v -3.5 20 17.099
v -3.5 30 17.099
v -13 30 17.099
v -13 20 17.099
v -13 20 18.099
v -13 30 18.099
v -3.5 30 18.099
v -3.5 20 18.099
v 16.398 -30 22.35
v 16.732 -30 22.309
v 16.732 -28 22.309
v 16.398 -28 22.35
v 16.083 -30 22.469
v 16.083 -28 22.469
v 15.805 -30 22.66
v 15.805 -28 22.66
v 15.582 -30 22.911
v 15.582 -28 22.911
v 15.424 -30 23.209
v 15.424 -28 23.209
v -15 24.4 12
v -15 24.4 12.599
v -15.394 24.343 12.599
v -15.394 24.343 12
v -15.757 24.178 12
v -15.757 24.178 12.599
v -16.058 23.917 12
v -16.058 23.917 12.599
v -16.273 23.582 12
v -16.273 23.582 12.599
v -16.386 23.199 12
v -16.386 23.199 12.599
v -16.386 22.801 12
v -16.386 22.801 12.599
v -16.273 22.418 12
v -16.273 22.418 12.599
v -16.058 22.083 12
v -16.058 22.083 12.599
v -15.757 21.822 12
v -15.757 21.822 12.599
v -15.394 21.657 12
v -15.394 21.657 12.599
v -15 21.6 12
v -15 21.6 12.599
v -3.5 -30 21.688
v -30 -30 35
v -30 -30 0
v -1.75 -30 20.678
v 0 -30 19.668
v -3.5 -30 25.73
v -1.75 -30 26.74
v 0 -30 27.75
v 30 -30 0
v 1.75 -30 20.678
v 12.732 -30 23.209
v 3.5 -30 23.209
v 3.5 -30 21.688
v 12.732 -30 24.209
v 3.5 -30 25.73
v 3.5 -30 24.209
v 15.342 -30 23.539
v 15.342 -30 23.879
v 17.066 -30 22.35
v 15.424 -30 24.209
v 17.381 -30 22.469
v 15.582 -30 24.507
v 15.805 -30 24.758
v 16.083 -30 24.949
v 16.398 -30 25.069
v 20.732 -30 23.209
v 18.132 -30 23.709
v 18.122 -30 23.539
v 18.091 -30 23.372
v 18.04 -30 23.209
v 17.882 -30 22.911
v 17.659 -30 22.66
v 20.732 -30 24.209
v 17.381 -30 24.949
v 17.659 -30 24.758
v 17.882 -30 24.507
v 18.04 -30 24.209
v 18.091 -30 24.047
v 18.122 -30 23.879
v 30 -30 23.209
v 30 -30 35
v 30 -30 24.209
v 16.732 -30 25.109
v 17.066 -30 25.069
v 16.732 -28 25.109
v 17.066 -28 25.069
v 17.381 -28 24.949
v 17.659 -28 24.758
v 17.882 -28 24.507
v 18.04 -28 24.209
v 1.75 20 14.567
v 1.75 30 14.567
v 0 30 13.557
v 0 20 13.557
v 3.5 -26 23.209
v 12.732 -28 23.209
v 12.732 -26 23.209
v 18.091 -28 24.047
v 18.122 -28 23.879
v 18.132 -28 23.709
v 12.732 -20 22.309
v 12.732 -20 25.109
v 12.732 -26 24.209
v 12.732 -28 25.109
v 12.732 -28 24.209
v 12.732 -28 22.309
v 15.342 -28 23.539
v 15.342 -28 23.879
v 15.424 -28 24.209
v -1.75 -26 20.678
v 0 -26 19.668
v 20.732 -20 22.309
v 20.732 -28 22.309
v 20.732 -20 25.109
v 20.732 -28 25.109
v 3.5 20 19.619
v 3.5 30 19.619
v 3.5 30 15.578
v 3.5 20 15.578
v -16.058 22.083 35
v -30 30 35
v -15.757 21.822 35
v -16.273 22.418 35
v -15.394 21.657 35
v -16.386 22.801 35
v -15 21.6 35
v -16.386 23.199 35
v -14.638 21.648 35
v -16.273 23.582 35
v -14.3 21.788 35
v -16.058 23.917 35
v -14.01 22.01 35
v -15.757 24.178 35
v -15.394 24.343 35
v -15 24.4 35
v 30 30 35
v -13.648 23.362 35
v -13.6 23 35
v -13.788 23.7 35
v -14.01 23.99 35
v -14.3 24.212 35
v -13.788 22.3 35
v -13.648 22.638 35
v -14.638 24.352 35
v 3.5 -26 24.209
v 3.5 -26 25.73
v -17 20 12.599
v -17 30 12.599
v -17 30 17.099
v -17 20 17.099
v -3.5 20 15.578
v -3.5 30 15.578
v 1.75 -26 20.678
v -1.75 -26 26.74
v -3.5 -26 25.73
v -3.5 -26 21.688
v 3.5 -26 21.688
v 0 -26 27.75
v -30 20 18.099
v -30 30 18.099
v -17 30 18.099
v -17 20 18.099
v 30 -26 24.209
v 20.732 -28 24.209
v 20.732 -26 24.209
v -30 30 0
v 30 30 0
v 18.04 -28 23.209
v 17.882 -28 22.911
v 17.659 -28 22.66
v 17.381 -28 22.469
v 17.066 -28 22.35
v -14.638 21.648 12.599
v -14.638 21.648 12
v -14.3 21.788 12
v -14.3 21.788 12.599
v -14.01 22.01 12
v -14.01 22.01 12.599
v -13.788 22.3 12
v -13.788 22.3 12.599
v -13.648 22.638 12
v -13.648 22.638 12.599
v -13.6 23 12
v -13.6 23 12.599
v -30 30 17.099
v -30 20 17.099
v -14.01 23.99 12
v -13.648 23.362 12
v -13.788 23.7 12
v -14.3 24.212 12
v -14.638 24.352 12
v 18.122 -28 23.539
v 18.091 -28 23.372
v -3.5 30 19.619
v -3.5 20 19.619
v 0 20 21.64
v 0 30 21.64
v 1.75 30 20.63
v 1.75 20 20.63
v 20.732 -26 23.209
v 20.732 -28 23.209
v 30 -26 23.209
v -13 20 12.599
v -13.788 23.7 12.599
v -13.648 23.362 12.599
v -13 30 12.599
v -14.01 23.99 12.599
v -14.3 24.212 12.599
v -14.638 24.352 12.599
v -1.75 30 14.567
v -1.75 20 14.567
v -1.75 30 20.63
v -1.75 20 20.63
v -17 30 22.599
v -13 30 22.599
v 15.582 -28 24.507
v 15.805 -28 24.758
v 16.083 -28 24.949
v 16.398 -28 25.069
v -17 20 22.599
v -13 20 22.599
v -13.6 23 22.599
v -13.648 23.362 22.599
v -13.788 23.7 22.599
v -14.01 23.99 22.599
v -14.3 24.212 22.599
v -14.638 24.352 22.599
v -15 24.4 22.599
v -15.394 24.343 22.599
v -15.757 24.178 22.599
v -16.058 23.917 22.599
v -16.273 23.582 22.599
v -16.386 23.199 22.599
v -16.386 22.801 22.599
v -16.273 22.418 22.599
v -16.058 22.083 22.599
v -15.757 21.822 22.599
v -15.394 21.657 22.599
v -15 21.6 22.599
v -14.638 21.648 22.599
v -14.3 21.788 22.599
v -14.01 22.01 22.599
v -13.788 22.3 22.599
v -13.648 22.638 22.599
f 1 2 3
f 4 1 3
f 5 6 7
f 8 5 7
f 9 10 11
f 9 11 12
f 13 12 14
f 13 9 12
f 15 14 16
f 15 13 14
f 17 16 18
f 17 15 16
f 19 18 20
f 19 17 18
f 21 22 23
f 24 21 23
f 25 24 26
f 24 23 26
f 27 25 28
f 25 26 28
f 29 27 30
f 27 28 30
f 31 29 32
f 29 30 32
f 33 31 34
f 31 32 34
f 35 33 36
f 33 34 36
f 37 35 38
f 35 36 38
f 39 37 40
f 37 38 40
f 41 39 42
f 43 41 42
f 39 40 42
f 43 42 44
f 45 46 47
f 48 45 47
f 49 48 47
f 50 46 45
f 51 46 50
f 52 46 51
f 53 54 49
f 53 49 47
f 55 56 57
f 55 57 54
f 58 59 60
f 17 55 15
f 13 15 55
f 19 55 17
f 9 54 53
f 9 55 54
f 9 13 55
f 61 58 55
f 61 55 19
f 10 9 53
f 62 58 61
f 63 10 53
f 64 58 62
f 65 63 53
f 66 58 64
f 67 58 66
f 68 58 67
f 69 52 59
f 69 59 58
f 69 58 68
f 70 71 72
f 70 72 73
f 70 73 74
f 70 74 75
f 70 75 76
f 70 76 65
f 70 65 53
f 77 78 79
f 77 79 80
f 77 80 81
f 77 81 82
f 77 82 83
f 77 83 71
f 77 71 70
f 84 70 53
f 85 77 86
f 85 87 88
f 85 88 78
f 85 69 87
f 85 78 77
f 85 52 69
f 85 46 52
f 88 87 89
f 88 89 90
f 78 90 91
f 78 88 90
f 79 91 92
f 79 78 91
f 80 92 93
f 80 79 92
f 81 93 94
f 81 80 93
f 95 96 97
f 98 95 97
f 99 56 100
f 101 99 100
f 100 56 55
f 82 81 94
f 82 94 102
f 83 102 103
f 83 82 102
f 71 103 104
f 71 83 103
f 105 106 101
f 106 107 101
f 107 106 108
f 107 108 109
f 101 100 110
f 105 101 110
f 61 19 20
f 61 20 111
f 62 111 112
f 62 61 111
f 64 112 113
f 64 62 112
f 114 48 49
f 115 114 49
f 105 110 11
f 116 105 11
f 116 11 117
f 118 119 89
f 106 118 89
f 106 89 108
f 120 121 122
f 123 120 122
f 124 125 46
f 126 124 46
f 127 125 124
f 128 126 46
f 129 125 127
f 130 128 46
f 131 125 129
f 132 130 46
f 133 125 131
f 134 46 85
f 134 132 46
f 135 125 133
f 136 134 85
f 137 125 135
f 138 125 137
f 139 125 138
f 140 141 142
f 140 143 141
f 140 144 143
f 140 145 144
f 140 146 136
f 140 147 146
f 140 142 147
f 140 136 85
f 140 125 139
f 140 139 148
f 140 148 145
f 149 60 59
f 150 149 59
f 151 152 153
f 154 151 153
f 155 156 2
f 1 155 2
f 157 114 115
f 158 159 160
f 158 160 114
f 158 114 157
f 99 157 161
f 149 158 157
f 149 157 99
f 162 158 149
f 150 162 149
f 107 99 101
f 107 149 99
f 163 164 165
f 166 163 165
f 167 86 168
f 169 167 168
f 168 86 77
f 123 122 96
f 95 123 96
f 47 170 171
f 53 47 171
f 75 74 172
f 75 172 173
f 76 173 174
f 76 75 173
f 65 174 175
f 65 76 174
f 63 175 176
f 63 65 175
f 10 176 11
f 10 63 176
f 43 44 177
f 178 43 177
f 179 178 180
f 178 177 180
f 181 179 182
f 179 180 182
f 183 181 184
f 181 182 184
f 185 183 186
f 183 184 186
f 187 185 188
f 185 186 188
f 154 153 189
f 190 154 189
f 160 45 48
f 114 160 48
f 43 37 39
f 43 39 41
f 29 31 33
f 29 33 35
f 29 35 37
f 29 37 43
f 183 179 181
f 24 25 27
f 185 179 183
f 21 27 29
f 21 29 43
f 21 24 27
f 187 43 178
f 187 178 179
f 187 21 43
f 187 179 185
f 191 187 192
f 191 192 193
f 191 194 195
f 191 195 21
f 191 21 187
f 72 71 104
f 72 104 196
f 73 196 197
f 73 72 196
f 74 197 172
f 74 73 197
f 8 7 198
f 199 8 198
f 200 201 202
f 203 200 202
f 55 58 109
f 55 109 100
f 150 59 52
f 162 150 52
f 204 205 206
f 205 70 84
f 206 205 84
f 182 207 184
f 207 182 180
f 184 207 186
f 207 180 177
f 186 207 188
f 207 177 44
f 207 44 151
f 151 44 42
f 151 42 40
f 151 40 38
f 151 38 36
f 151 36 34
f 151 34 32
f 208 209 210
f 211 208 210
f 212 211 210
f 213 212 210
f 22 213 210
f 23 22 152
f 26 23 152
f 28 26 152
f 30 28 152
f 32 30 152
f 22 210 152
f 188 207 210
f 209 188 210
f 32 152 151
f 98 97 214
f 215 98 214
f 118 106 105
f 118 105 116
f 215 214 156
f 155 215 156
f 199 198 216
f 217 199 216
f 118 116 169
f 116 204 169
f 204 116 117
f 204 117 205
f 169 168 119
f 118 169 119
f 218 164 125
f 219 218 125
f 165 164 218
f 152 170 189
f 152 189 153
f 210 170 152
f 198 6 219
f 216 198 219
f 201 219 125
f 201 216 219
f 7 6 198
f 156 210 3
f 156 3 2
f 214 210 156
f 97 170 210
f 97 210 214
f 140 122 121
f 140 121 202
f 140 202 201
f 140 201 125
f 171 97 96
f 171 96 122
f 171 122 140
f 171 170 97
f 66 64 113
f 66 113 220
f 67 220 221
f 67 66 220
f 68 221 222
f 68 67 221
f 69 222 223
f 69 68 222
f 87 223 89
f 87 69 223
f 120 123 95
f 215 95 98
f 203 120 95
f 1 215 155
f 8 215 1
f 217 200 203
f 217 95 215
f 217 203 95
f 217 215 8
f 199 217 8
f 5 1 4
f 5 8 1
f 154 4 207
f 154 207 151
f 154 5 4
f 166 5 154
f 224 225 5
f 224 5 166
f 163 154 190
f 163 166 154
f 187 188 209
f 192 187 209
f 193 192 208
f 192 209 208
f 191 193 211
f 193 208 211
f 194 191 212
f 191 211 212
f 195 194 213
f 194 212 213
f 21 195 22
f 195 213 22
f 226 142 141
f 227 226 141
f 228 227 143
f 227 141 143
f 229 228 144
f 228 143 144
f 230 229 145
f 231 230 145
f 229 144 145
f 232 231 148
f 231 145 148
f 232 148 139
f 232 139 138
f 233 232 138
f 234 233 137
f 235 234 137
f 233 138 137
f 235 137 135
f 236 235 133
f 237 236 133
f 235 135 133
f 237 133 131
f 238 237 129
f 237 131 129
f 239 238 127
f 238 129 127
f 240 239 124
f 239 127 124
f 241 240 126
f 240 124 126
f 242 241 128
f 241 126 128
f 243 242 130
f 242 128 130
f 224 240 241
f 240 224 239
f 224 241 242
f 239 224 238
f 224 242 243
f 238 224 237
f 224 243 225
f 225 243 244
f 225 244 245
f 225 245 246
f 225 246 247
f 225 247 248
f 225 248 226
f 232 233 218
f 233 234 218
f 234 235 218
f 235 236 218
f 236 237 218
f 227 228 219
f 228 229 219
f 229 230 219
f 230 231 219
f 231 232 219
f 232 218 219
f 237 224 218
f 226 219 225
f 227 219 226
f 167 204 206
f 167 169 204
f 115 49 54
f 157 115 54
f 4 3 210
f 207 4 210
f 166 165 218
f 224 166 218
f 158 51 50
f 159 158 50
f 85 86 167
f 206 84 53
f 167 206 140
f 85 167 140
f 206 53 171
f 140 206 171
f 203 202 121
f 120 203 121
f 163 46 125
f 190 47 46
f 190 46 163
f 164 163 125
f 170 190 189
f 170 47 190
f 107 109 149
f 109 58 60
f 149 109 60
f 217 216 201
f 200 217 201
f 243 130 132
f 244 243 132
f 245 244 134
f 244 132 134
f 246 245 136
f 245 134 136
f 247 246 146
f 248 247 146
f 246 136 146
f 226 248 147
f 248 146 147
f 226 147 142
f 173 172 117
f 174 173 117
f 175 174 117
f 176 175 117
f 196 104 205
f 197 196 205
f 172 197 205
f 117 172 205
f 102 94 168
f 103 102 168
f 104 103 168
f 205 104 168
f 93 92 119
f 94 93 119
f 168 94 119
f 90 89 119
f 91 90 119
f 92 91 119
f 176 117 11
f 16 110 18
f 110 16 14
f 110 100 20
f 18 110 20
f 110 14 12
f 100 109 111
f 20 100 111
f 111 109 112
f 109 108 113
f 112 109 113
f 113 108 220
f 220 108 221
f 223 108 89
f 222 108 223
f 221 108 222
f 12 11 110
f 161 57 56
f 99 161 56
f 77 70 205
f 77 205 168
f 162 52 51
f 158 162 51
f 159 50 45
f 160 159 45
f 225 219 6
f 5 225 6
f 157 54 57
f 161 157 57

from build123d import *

# Parameters (mm, degrees)
F0_W     = 60
F0_H     = 60
F1_DEPTH = 35
F3_DEPTH = 10
F2_W     = 9.2679491924
F2_H     = 1
F4_DEPTH = 4
F5_DEPTH = 2
F6_W     = 2
F6_H     = 0.5
F6_H_2   = 4.5
F6_W_2   = 1.75
F7_DEPTH = 10
F9_DEPTH = 23


with BuildPart() as f1:
    # F0 (on Top) → F1 (new body)
    with BuildSketch(Plane.XY):
        Rectangle(F0_W, F0_H)
    extrude(amount=F1_DEPTH)

    # F2 (on face) → F3 (cut)
    with BuildSketch(Plane.XZ.offset(30)):
        with BuildLine():
            ThreePointArc((15.4243811245, 24.2090167701), (15.9383254142, 24.8622730296), (16.7320508076, 25.1090167701))
            Line((16.7320508076, 25.1090167701), (12.7320508076, 25.1090167701))
            Line((12.7320508076, 25.1090167701), (12.7320508076, 24.2090167701))
            Line((12.7320508076, 24.2090167701), (15.4243811245, 24.2090167701))
        make_face()
        with BuildLine():
            ThreePointArc((15.4243811245, 23.2090167701), (15.3320508076, 23.7090167701), (15.4243811245, 24.2090167701))
            Line((15.4243811245, 24.2090167701), (12.7320508076, 24.2090167701))
            Line((12.7320508076, 24.2090167701), (12.7320508076, 23.2090167701))
            Line((12.7320508076, 23.2090167701), (15.4243811245, 23.2090167701))
        make_face()
        with BuildLine():
            Line((12.7320508076, 22.3090167701), (16.7320508076, 22.3090167701))
            ThreePointArc((16.7320508076, 22.3090167701), (15.9383254142, 22.5557605107), (15.4243811245, 23.2090167701))
            Line((15.4243811245, 23.2090167701), (12.7320508076, 23.2090167701))
            Line((12.7320508076, 23.2090167701), (12.7320508076, 22.3090167701))
        make_face()
        with BuildLine():
            ThreePointArc((18.1320508076, 23.7090167701), (18.1087747371, 23.9632434836), (18.0397204906, 24.2090167701))
            ThreePointArc((18.0397204906, 24.2090167701), (17.5257762009, 24.8622730296), (16.7320508076, 25.1090167701))
            ThreePointArc((16.7320508076, 25.1090167701), (15.9383254142, 24.8622730296), (15.4243811245, 24.2090167701))
            ThreePointArc((15.4243811245, 24.2090167701), (15.3320508076, 23.7090167701), (15.4243811245, 23.2090167701))
            ThreePointArc((15.4243811245, 23.2090167701), (15.9383254142, 22.5557605107), (16.7320508076, 22.3090167701))
            ThreePointArc((16.7320508076, 22.3090167701), (17.5257762009, 22.5557605107), (18.0397204906, 23.2090167701))
            ThreePointArc((18.0397204906, 23.2090167701), (18.1087747371, 23.4547900566), (18.1320508076, 23.7090167701))
        make_face()
        with BuildLine():
            Line((18.0397204906, 24.2090167701), (20.7320508076, 24.2090167701))
            Line((20.7320508076, 24.2090167701), (20.7320508076, 25.1090167701))
            Line((20.7320508076, 25.1090167701), (16.7320508076, 25.1090167701))
            ThreePointArc((16.7320508076, 25.1090167701), (17.5257762009, 24.8622730296), (18.0397204906, 24.2090167701))
        make_face()
        with BuildLine():
            Line((20.7320508076, 23.2090167701), (20.7320508076, 24.2090167701))
            Line((20.7320508076, 24.2090167701), (18.0397204906, 24.2090167701))
            ThreePointArc((18.0397204906, 24.2090167701), (18.1087747371, 23.9632434836), (18.1320508076, 23.7090167701))
            ThreePointArc((18.1320508076, 23.7090167701), (18.1087747371, 23.4547900566), (18.0397204906, 23.2090167701))
            Line((18.0397204906, 23.2090167701), (20.7320508076, 23.2090167701))
        make_face()
        with BuildLine():
            Line((20.7320508076, 22.3090167701), (20.7320508076, 23.2090167701))
            Line((20.7320508076, 23.2090167701), (18.0397204906, 23.2090167701))
            ThreePointArc((18.0397204906, 23.2090167701), (17.5257762009, 22.5557605107), (16.7320508076, 22.3090167701))
            Line((16.7320508076, 22.3090167701), (20.7320508076, 22.3090167701))
        make_face()
    extrude(amount=-F3_DEPTH, mode=Mode.SUBTRACT)

    # F2 (on face) → F4 (cut)
    with BuildSketch(Plane.XZ.offset(30)):
        with Locations((25.3660254038, 23.7090167701)):
            Rectangle(F2_W, F2_H)
        with BuildLine():
            Line((20.7320508076, 23.2090167701), (20.7320508076, 24.2090167701))
            Line((20.7320508076, 24.2090167701), (18.0397204906, 24.2090167701))
            ThreePointArc((18.0397204906, 24.2090167701), (18.1087747371, 23.9632434836), (18.1320508076, 23.7090167701))
            ThreePointArc((18.1320508076, 23.7090167701), (18.1087747371, 23.4547900566), (18.0397204906, 23.2090167701))
            Line((18.0397204906, 23.2090167701), (20.7320508076, 23.2090167701))
        make_face()
        with BuildLine():
            Line((18.0397204906, 24.2090167701), (20.7320508076, 24.2090167701))
            Line((20.7320508076, 24.2090167701), (20.7320508076, 25.1090167701))
            Line((20.7320508076, 25.1090167701), (16.7320508076, 25.1090167701))
            ThreePointArc((16.7320508076, 25.1090167701), (17.5257762009, 24.8622730296), (18.0397204906, 24.2090167701))
        make_face()
        with BuildLine():
            ThreePointArc((18.1320508076, 23.7090167701), (18.1087747371, 23.9632434836), (18.0397204906, 24.2090167701))
            ThreePointArc((18.0397204906, 24.2090167701), (17.5257762009, 24.8622730296), (16.7320508076, 25.1090167701))
            ThreePointArc((16.7320508076, 25.1090167701), (15.9383254142, 24.8622730296), (15.4243811245, 24.2090167701))
            ThreePointArc((15.4243811245, 24.2090167701), (15.3320508076, 23.7090167701), (15.4243811245, 23.2090167701))
            ThreePointArc((15.4243811245, 23.2090167701), (15.9383254142, 22.5557605107), (16.7320508076, 22.3090167701))
            ThreePointArc((16.7320508076, 22.3090167701), (17.5257762009, 22.5557605107), (18.0397204906, 23.2090167701))
            ThreePointArc((18.0397204906, 23.2090167701), (18.1087747371, 23.4547900566), (18.1320508076, 23.7090167701))
        make_face()
        with BuildLine():
            Line((20.7320508076, 22.3090167701), (20.7320508076, 23.2090167701))
            Line((20.7320508076, 23.2090167701), (18.0397204906, 23.2090167701))
            ThreePointArc((18.0397204906, 23.2090167701), (17.5257762009, 22.5557605107), (16.7320508076, 22.3090167701))
            Line((16.7320508076, 22.3090167701), (20.7320508076, 22.3090167701))
        make_face()
        with BuildLine():
            ThreePointArc((15.4243811245, 24.2090167701), (15.9383254142, 24.8622730296), (16.7320508076, 25.1090167701))
            Line((16.7320508076, 25.1090167701), (12.7320508076, 25.1090167701))
            Line((12.7320508076, 25.1090167701), (12.7320508076, 24.2090167701))
            Line((12.7320508076, 24.2090167701), (15.4243811245, 24.2090167701))
        make_face()
        with BuildLine():
            ThreePointArc((15.4243811245, 23.2090167701), (15.3320508076, 23.7090167701), (15.4243811245, 24.2090167701))
            Line((15.4243811245, 24.2090167701), (12.7320508076, 24.2090167701))
            Line((12.7320508076, 24.2090167701), (12.7320508076, 23.2090167701))
            Line((12.7320508076, 23.2090167701), (15.4243811245, 23.2090167701))
        make_face()
        with BuildLine():
            Line((12.7320508076, 22.3090167701), (16.7320508076, 22.3090167701))
            ThreePointArc((16.7320508076, 22.3090167701), (15.9383254142, 22.5557605107), (15.4243811245, 23.2090167701))
            Line((15.4243811245, 23.2090167701), (12.7320508076, 23.2090167701))
            Line((12.7320508076, 23.2090167701), (12.7320508076, 22.3090167701))
        make_face()
        Polygon((12.7320508076, 23.2090167701), (12.7320508076, 24.2090167701), (3.5, 24.2090167701), (3.5, 23.7090167701), (3.5, 23.2090167701), align=None)
        with BuildLine():
            Line((3.4641016151, 24.2090167701), (3.5, 24.2090167701))
            Line((3.5, 24.2090167701), (3.5, 25.7297427123))
            Line((3.5, 25.7297427123), (1.7500000362, 26.7401056625))
            ThreePointArc((1.7500000362, 26.7401056625), (2.897984947, 25.6715873414), (3.4641016151, 24.2090167701))
        make_face()
        with BuildLine():
            Line((3.5, 23.7090167701), (3.5, 24.2090167701))
            Line((3.5, 24.2090167701), (3.4641016151, 24.2090167701))
            ThreePointArc((3.4641016151, 24.2090167701), (3.491013868, 23.9596602889), (3.5, 23.7090167701))
        make_face()
        with BuildLine():
            Line((3.4641016151, 23.2090167701), (3.5, 23.2090167701))
            Line((3.5, 23.2090167701), (3.5, 23.7090167701))
            ThreePointArc((3.5, 23.7090167701), (3.491013868, 23.4583732513), (3.4641016151, 23.2090167701))
        make_face()
        with BuildLine():
            Line((3.5, 21.688290828), (3.5, 23.2090167701))
            Line((3.5, 23.2090167701), (3.4641016151, 23.2090167701))
            ThreePointArc((3.4641016151, 23.2090167701), (2.8979849006, 21.7464461304), (1.7499998929, 20.6779277951))
            Line((1.7499998929, 20.6779277951), (3.5, 21.688290828))
        make_face()
        with BuildLine():
            ThreePointArc((3.4641016151, 23.2090167701), (3.491013868, 23.4583732513), (3.5, 23.7090167701))
            ThreePointArc((3.5, 23.7090167701), (3.491013868, 23.9596602889), (3.4641016151, 24.2090167701))
            ThreePointArc((3.4641016151, 24.2090167701), (2.897984947, 25.6715873414), (1.7500000362, 26.7401056625))
            ThreePointArc((1.7500000362, 26.7401056625), (-1.83e-08, 27.2090167701), (-1.7500000679, 26.7401056441))
            ThreePointArc((-1.7500000679, 26.7401056441), (-3.0310889329, 25.4590167362), (-3.5, 23.7090167701))
            ThreePointArc((-3.5, 23.7090167701), (-3.0310889298, 21.9590167989), (-1.7500000575, 20.6779278901))
            ThreePointArc((-1.7500000575, 20.6779278901), (-9.5e-08, 20.2090167701), (1.7499998929, 20.6779277951))
            ThreePointArc((1.7499998929, 20.6779277951), (2.8979849006, 21.7464461304), (3.4641016151, 23.2090167701))
        make_face()
        with BuildLine():
            ThreePointArc((-1.7500000679, 26.7401056441), (-1.83e-08, 27.2090167701), (1.7500000362, 26.7401056625))
            Line((1.7500000362, 26.7401056625), (0, 27.7504686545))
            Line((0, 27.7504686545), (-1.7500000679, 26.7401056441))
        make_face()
        with BuildLine():
            Line((0, 19.6675648858), (1.7499998929, 20.6779277951))
            ThreePointArc((1.7499998929, 20.6779277951), (-9.5e-08, 20.2090167701), (-1.7500000575, 20.6779278901))
            Line((-1.7500000575, 20.6779278901), (0, 19.6675648858))
        make_face()
        with BuildLine():
            ThreePointArc((-3.5, 23.7090167701), (-3.0310889329, 25.4590167362), (-1.7500000679, 26.7401056441))
            Line((-1.7500000679, 26.7401056441), (-3.5, 25.7297427123))
            Line((-3.5, 25.7297427123), (-3.5, 23.7090167701))
        make_face()
        with BuildLine():
            Line((-3.5, 21.688290828), (-1.7500000575, 20.6779278901))
            ThreePointArc((-1.7500000575, 20.6779278901), (-3.0310889298, 21.9590167989), (-3.5, 23.7090167701))
            Line((-3.5, 23.7090167701), (-3.5, 21.688290828))
        make_face()
    extrude(amount=-F4_DEPTH, mode=Mode.SUBTRACT)

    # F2 (on face) → F5 (join)
    with BuildSketch(Plane.XZ.offset(30)):
        with BuildLine():
            Line((20.7320508076, 22.3090167701), (20.7320508076, 23.2090167701))
            Line((20.7320508076, 23.2090167701), (18.0397204906, 23.2090167701))
            ThreePointArc((18.0397204906, 23.2090167701), (17.5257762009, 22.5557605107), (16.7320508076, 22.3090167701))
            Line((16.7320508076, 22.3090167701), (20.7320508076, 22.3090167701))
        make_face()
        with BuildLine():
            ThreePointArc((15.4243811245, 24.2090167701), (15.9383254142, 24.8622730296), (16.7320508076, 25.1090167701))
            Line((16.7320508076, 25.1090167701), (12.7320508076, 25.1090167701))
            Line((12.7320508076, 25.1090167701), (12.7320508076, 24.2090167701))
            Line((12.7320508076, 24.2090167701), (15.4243811245, 24.2090167701))
        make_face()
        with BuildLine():
            Line((12.7320508076, 22.3090167701), (16.7320508076, 22.3090167701))
            ThreePointArc((16.7320508076, 22.3090167701), (15.9383254142, 22.5557605107), (15.4243811245, 23.2090167701))
            Line((15.4243811245, 23.2090167701), (12.7320508076, 23.2090167701))
            Line((12.7320508076, 23.2090167701), (12.7320508076, 22.3090167701))
        make_face()
        with BuildLine():
            Line((20.7320508076, 23.2090167701), (20.7320508076, 24.2090167701))
            Line((20.7320508076, 24.2090167701), (18.0397204906, 24.2090167701))
            ThreePointArc((18.0397204906, 24.2090167701), (18.1087747371, 23.9632434836), (18.1320508076, 23.7090167701))
            ThreePointArc((18.1320508076, 23.7090167701), (18.1087747371, 23.4547900566), (18.0397204906, 23.2090167701))
            Line((18.0397204906, 23.2090167701), (20.7320508076, 23.2090167701))
        make_face()
        with BuildLine():
            ThreePointArc((15.4243811245, 23.2090167701), (15.3320508076, 23.7090167701), (15.4243811245, 24.2090167701))
            Line((15.4243811245, 24.2090167701), (12.7320508076, 24.2090167701))
            Line((12.7320508076, 24.2090167701), (12.7320508076, 23.2090167701))
            Line((12.7320508076, 23.2090167701), (15.4243811245, 23.2090167701))
        make_face()
        with BuildLine():
            Line((18.0397204906, 24.2090167701), (20.7320508076, 24.2090167701))
            Line((20.7320508076, 24.2090167701), (20.7320508076, 25.1090167701))
            Line((20.7320508076, 25.1090167701), (16.7320508076, 25.1090167701))
            ThreePointArc((16.7320508076, 25.1090167701), (17.5257762009, 24.8622730296), (18.0397204906, 24.2090167701))
        make_face()
    extrude(amount=-F5_DEPTH)

    # F6 (on face) → F7 (cut)
    with BuildSketch(Plane(origin=(0, 30, 0), x_dir=(-1, 0, 0), z_dir=(0, 1, 0))):
        with BuildLine():
            ThreePointArc((-1.7499999142, 20.6296540127), (1.58e-08, 21.0985650499), (1.7499999416, 20.6296539969))
            Line((1.7499999416, 20.6296539969), (0, 21.6400169342))
            Line((0, 21.6400169342), (-1.7499999142, 20.6296540127))
        make_face()
        with BuildLine():
            Line((-3.5, 19.6192909921), (-3.5, 17.5985650499))
            ThreePointArc((-3.5, 17.5985650499), (-3.0310888885, 19.3485650928), (-1.7499999142, 20.6296540127))
            Line((-1.7499999142, 20.6296540127), (-3.5, 19.6192909921))
        make_face()
        with BuildLine():
            Line((-3.5, 15.5778391077), (-1.7500000132, 14.5674761443))
            ThreePointArc((-1.7500000132, 14.5674761443), (-3.0310889171, 15.8485650565), (-3.5, 17.5985650499))
            Line((-3.5, 17.5985650499), (-3.5, 15.5778391077))
        make_face()
        with BuildLine():
            Line((0, 13.5571131656), (1.7500000301, 14.567476154))
            ThreePointArc((1.7500000301, 14.567476154), (9.8e-09, 14.0985650499), (-1.7500000132, 14.5674761443))
            Line((-1.7500000132, 14.5674761443), (0, 13.5571131656))
        make_face()
        with BuildLine():
            Line((3.5, 15.5778391077), (3.5, 17.0985650499))
            Line((3.5, 17.0985650499), (3.4641016151, 17.0985650499))
            ThreePointArc((3.4641016151, 17.0985650499), (2.897984945, 15.6359944757), (1.7500000301, 14.567476154))
            Line((1.7500000301, 14.567476154), (3.5, 15.5778391077))
        make_face()
        with BuildLine():
            Line((3.4641016151, 17.0985650499), (3.5, 17.0985650499))
            Line((3.5, 17.0985650499), (3.5, 17.5985650499))
            ThreePointArc((3.5, 17.5985650499), (3.491013868, 17.3479215311), (3.4641016151, 17.0985650499))
        make_face()
        with BuildLine():
            ThreePointArc((3.4641016151, 18.0985650499), (3.491013868, 17.8492085687), (3.5, 17.5985650499))
            Line((3.5, 17.5985650499), (3.5, 18.0985650499))
            Line((3.5, 18.0985650499), (3.4641016151, 18.0985650499))
        make_face()
        with BuildLine():
            ThreePointArc((1.7499999416, 20.6296539969), (2.8979849163, 19.5611356664), (3.4641016151, 18.0985650499))
            Line((3.4641016151, 18.0985650499), (3.5, 18.0985650499))
            Line((3.5, 18.0985650499), (3.5, 19.6192909921))
            Line((3.5, 19.6192909921), (1.7499999416, 20.6296539969))
        make_face()
        Polygon((17, 17.0985650499), (30, 17.0985650499), (30, 18.0985650499), (17, 18.0985650499), (17, 17.5985650499), align=None)
        with BuildLine():
            ThreePointArc((1.7500000301, 14.567476154), (2.897984945, 15.6359944757), (3.4641016151, 17.0985650499))
            Line((3.4641016151, 17.0985650499), (0, 17.0985650499))
            Line((0, 17.0985650499), (0, 18.0985650499))
            Line((0, 18.0985650499), (3.4641016151, 18.0985650499))
            ThreePointArc((3.4641016151, 18.0985650499), (2.8979849163, 19.5611356664), (1.7499999416, 20.6296539969))
            ThreePointArc((1.7499999416, 20.6296539969), (1.58e-08, 21.0985650499), (-1.7499999142, 20.6296540127))
            ThreePointArc((-1.7499999142, 20.6296540127), (-3.0310888885, 19.3485650928), (-3.5, 17.5985650499))
            ThreePointArc((-3.5, 17.5985650499), (-3.0310889171, 15.8485650565), (-1.7500000132, 14.5674761443))
            ThreePointArc((-1.7500000132, 14.5674761443), (9.8e-09, 14.0985650499), (1.7500000301, 14.567476154))
        make_face()
        with Locations((14, 17.3485650499)):
            Rectangle(F6_W, F6_H)
        with Locations((16, 17.3485650499)):
            Rectangle(F6_W, F6_H)
        with Locations((16, 14.8485650499)):
            Rectangle(F6_W, F6_H_2)
        with Locations((14, 14.8485650499)):
            Rectangle(F6_W, F6_H_2)
        with BuildLine():
            Line((0, 17.0985650499), (3.4641016151, 17.0985650499))
            ThreePointArc((3.4641016151, 17.0985650499), (3.491013868, 17.3479215311), (3.5, 17.5985650499))
            ThreePointArc((3.5, 17.5985650499), (3.491013868, 17.8492085687), (3.4641016151, 18.0985650499))
            Line((3.4641016151, 18.0985650499), (0, 18.0985650499))
            Line((0, 18.0985650499), (0, 17.0985650499))
        make_face()
        Polygon((15, 18.0985650499), (15.25, 18.0985650499), (15.25, 22.5985650499), (14.75, 22.5985650499), (14.75, 18.0985650499), align=None)
        with Locations((13.875, 20.3485650499)):
            Rectangle(F6_W_2, F6_H_2)
        with Locations((16.125, 20.3485650499)):
            Rectangle(F6_W_2, F6_H_2)
        Polygon((13, 17.5985650499), (15, 17.5985650499), (15, 18.0985650499), (14.75, 18.0985650499), (13, 18.0985650499), align=None)
        Polygon((15, 17.5985650499), (17, 17.5985650499), (17, 18.0985650499), (15.25, 18.0985650499), (15, 18.0985650499), align=None)
        Polygon((3.5, 17.0985650499), (13, 17.0985650499), (13, 17.5985650499), (13, 18.0985650499), (3.5, 18.0985650499), (3.5, 17.5985650499), align=None)
    extrude(amount=-F7_DEPTH, mode=Mode.SUBTRACT)

    # F8 (on face) → F9 (cut)
    with BuildSketch(Plane.XY.offset(35)):
        with BuildLine():
            ThreePointArc((-13.6, 23), (-14.0100505063, 23.9899494937), (-15, 24.4))
            Line((-15, 24.4), (-15, 21.6))
            ThreePointArc((-15, 21.6), (-14.0100505063, 22.0100505063), (-13.6, 23))
        make_face()
        with BuildLine():
            Line((-15, 21.6), (-15, 24.4))
            ThreePointArc((-15, 24.4), (-16.4, 23), (-15, 21.6))
        make_face()
    extrude(amount=-F9_DEPTH, mode=Mode.SUBTRACT)


solid = f1.part
